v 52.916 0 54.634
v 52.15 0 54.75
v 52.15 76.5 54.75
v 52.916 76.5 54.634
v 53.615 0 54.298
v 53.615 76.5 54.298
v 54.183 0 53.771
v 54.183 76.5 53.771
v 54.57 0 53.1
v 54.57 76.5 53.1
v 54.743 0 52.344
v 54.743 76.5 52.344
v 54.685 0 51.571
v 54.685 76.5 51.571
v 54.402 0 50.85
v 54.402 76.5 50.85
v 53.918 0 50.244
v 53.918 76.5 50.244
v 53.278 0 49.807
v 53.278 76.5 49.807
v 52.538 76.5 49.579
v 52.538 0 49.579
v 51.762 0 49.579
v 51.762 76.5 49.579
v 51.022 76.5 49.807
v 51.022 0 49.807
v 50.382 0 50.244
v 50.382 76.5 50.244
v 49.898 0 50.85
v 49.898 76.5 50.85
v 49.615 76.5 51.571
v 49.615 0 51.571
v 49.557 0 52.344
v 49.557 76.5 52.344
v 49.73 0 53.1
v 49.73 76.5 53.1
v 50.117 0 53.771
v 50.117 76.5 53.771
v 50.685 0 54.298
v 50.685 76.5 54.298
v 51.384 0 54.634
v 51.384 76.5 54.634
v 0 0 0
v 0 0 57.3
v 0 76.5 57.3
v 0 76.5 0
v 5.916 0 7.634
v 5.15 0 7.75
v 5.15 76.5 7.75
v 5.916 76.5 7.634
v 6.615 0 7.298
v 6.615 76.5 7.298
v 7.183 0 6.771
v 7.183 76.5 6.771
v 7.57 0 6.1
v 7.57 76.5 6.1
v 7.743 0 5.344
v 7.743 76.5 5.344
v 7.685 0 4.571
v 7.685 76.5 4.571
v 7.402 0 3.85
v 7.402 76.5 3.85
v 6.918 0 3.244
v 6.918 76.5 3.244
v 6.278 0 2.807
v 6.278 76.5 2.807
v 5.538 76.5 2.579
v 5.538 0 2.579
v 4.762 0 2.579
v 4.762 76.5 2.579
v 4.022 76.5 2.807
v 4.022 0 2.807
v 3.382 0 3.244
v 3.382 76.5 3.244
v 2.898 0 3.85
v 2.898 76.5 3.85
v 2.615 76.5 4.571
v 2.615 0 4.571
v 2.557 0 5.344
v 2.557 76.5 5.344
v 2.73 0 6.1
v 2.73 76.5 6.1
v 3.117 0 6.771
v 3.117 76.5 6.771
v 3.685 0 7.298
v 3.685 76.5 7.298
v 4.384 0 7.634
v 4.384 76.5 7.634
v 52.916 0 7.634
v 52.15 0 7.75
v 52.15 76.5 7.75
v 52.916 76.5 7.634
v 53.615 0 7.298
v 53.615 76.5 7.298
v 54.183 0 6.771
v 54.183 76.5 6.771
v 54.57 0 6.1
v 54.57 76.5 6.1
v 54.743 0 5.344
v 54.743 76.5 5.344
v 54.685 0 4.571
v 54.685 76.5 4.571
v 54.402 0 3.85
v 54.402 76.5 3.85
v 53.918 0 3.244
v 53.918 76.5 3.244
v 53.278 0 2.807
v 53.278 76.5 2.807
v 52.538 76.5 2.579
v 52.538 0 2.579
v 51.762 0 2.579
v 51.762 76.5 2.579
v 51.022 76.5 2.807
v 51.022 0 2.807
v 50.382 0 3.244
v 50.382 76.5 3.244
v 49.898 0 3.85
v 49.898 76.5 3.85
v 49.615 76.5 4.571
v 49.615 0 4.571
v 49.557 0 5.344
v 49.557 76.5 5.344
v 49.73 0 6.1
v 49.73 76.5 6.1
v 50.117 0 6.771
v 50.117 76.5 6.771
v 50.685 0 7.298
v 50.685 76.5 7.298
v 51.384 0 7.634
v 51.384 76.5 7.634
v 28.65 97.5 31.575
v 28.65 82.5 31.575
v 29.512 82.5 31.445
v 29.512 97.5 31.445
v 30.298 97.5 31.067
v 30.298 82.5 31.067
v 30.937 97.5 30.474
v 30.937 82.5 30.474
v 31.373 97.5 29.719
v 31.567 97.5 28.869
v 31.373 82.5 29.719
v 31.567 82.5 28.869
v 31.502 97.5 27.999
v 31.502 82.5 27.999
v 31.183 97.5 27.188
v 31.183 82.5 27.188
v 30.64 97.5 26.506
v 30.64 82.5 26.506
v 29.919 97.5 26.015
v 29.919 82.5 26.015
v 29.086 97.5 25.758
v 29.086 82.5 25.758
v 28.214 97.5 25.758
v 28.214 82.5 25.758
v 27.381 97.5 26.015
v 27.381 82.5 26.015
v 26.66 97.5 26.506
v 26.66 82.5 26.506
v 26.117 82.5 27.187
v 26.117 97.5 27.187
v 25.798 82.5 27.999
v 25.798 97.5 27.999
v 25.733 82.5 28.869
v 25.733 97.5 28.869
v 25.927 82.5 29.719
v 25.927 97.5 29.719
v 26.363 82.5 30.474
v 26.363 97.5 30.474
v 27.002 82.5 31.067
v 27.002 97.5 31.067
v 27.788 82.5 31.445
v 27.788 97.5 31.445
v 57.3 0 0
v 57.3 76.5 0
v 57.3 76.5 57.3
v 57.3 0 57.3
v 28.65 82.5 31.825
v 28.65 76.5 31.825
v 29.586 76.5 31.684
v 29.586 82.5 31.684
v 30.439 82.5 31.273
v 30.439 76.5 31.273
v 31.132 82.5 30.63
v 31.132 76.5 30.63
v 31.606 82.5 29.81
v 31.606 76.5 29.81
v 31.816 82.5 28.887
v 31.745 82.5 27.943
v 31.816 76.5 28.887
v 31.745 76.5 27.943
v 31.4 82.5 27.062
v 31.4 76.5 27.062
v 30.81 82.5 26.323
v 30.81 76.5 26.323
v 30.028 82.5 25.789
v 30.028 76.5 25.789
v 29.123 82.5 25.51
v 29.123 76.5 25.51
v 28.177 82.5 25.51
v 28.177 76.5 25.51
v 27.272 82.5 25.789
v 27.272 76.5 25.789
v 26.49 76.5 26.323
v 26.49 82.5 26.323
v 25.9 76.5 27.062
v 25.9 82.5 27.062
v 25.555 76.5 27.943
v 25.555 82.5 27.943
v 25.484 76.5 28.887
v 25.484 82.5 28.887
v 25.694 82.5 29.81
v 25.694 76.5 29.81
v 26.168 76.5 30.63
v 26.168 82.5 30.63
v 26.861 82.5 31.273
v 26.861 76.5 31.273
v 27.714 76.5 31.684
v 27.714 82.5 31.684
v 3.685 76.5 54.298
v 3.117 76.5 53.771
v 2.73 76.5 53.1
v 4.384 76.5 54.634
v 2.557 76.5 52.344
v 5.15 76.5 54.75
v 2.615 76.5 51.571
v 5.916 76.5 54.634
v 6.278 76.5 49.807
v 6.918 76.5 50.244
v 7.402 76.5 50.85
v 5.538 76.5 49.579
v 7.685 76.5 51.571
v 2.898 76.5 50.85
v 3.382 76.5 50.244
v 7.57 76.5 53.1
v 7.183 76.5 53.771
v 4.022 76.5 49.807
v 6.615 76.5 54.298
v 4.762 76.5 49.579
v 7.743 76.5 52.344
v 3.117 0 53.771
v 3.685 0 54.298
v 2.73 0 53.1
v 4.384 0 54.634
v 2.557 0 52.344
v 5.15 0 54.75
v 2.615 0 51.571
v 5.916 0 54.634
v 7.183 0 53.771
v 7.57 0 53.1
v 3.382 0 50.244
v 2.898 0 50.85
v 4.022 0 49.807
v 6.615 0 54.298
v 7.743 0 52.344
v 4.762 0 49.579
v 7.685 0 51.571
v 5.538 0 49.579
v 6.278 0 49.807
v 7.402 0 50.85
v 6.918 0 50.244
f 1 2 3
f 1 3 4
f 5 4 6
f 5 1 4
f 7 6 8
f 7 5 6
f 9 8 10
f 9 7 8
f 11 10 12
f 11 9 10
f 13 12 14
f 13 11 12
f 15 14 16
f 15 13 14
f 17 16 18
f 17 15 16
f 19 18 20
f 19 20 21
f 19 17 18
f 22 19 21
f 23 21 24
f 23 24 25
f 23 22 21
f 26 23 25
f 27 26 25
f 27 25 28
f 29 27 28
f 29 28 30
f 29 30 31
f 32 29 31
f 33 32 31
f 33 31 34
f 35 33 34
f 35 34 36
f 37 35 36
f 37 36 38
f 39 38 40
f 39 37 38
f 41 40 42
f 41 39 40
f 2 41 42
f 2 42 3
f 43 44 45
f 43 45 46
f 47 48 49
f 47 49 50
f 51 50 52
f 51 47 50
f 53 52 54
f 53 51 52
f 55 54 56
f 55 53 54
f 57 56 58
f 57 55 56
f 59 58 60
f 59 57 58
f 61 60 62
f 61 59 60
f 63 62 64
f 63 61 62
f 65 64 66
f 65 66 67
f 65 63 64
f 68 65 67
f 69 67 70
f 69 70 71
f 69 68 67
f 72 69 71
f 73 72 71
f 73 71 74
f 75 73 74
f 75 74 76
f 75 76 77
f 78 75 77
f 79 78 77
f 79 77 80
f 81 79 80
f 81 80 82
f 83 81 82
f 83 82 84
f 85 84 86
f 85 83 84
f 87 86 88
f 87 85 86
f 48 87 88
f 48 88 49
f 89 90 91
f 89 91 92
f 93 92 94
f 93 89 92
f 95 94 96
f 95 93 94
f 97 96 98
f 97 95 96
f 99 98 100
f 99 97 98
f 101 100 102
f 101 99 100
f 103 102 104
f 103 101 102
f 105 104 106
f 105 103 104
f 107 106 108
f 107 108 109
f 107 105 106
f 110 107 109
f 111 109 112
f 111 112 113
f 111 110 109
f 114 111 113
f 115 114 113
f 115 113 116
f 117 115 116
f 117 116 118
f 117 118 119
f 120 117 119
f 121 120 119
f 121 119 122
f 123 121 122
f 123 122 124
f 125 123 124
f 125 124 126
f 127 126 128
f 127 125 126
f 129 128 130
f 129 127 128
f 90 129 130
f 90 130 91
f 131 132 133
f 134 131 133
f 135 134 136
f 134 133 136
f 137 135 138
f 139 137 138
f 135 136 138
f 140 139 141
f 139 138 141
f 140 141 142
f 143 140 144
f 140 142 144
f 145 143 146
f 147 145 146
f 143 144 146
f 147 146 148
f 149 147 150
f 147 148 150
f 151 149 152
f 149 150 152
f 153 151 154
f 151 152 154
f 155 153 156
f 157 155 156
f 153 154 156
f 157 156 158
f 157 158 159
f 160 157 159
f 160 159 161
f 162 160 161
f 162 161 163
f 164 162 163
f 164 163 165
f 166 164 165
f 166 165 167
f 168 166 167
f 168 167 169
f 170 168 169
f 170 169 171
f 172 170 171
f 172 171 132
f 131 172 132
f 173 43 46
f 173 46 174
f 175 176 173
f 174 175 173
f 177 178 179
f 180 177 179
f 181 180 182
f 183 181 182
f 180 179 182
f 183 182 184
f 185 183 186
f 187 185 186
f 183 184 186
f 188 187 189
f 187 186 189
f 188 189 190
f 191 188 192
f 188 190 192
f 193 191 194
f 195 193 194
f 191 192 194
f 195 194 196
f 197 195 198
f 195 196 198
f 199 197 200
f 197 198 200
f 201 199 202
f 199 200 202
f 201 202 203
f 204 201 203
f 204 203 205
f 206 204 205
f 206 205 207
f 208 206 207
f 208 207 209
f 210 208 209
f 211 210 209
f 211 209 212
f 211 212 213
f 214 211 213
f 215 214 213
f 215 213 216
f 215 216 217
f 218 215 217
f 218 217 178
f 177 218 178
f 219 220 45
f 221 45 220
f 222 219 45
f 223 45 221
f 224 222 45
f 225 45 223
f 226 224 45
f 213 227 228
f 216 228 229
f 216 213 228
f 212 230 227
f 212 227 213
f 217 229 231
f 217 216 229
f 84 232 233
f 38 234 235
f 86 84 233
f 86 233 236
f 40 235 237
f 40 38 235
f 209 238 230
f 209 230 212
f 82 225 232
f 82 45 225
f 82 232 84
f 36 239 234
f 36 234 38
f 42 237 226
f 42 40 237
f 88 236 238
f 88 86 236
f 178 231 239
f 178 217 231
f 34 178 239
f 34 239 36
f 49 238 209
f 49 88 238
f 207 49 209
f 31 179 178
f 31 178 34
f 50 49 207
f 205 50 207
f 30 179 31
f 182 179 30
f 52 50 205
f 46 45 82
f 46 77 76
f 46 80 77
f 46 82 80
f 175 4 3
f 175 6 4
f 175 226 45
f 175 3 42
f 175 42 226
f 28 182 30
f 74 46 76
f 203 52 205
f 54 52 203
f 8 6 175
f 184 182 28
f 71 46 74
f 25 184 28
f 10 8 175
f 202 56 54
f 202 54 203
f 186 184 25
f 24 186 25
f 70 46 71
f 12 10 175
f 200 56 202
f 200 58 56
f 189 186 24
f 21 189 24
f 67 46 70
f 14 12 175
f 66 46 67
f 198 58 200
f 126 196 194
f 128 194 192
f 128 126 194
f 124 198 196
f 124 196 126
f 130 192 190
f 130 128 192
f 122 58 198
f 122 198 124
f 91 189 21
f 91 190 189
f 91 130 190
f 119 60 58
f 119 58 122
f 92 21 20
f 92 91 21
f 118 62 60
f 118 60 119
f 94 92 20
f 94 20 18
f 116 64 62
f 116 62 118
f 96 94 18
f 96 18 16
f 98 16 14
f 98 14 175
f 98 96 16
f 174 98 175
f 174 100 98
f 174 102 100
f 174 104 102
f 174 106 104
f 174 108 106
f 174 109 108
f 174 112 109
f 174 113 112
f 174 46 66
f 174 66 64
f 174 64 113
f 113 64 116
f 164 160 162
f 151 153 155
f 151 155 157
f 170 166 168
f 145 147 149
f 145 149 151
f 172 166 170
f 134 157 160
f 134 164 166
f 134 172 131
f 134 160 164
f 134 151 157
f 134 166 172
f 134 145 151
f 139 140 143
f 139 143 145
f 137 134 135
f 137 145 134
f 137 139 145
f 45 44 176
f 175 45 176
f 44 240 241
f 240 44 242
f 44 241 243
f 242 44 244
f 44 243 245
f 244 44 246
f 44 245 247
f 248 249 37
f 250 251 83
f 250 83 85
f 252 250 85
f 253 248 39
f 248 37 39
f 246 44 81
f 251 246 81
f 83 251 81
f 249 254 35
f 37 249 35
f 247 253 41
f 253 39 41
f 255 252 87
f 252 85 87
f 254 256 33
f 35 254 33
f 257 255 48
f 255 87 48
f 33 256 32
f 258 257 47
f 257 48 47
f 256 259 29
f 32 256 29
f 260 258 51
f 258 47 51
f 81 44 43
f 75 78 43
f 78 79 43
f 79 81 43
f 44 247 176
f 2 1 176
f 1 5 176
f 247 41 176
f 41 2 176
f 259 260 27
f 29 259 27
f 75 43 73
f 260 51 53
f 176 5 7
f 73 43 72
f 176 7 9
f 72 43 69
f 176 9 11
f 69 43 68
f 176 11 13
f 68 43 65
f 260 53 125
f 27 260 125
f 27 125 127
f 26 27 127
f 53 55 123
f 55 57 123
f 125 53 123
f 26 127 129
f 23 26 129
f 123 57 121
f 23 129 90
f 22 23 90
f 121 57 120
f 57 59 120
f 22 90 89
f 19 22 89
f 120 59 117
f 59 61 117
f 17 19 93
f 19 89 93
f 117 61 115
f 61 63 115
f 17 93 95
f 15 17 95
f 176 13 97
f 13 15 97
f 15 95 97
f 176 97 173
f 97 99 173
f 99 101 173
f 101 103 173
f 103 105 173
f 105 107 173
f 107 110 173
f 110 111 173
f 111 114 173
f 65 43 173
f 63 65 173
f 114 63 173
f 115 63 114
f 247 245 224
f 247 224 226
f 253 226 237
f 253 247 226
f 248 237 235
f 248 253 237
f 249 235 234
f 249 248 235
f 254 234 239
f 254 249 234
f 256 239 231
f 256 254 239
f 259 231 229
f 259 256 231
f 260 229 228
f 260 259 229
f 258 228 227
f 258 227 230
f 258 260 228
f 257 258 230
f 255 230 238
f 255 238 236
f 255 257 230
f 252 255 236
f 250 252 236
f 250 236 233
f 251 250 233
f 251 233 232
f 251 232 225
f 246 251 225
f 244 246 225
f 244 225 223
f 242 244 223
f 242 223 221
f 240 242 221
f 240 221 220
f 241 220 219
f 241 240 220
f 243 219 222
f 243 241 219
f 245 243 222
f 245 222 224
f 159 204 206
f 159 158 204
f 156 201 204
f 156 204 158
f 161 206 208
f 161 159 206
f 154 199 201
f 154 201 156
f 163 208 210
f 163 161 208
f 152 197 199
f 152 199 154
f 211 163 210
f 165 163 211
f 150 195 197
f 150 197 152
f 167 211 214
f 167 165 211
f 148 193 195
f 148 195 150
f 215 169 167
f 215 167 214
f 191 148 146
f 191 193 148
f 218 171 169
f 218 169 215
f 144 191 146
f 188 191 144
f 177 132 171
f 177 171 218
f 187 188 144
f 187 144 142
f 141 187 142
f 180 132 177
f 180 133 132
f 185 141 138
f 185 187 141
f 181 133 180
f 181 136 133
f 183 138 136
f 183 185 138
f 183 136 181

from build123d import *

# Parameters (mm, degrees)
SKETCH1_W           = 57.3
SKETCH1_H           = 57.3
SKETCH1_R           = 2.6
SKETCH1_R_2         = 3.175
BOSS_EXTRUDE1_DEPTH = 76.5
SKETCH1_4_R         = 3.175
SKETCH1_4_R_2       = 2.925
BOSS_EXTRUDE2_DEPTH = 82.5
SKETCH1_5_R         = 2.925
BOSS_EXTRUDE3_DEPTH = 97.5


with BuildPart() as part:
    # Sketch1 → Boss-Extrude1 (new body)
    with BuildSketch(Plane(origin=(0, 0, 0), x_dir=(1, 0, 0), z_dir=(0, 1, 0))):
        with Locations((28.65, -28.65)):
            Rectangle(SKETCH1_W, SKETCH1_H)
        with Locations((5.15, -52.15)):
            Circle(SKETCH1_R, mode=Mode.SUBTRACT)
        with Locations((28.65, -28.65)):
            Circle(SKETCH1_R_2, mode=Mode.SUBTRACT)
        with Locations((52.15, -52.15)):
            Circle(SKETCH1_R, mode=Mode.SUBTRACT)
        with Locations((5.15, -5.15)):
            Circle(SKETCH1_R, mode=Mode.SUBTRACT)
        with Locations((52.15, -5.15)):
            Circle(SKETCH1_R, mode=Mode.SUBTRACT)
    extrude(amount=BOSS_EXTRUDE1_DEPTH)

    # Sketch1<4> → Boss-Extrude2 (add)
    with BuildSketch(Plane(origin=(0, 0, 0), x_dir=(1, 0, 0), z_dir=(0, 1, 0))):
        with Locations((28.65, -28.65)):
            Circle(SKETCH1_4_R)
        with Locations((28.65, -28.65)):
            Circle(SKETCH1_4_R_2, mode=Mode.SUBTRACT)
    extrude(amount=BOSS_EXTRUDE2_DEPTH)

    # Sketch1<5> → Boss-Extrude3 (add)
    with BuildSketch(Plane(origin=(0, 0, 0), x_dir=(1, 0, 0), z_dir=(0, 1, 0))):
        with Locations((28.65, -28.65)):
            Circle(SKETCH1_5_R)
    extrude(amount=BOSS_EXTRUDE3_DEPTH)


solid = part.part
